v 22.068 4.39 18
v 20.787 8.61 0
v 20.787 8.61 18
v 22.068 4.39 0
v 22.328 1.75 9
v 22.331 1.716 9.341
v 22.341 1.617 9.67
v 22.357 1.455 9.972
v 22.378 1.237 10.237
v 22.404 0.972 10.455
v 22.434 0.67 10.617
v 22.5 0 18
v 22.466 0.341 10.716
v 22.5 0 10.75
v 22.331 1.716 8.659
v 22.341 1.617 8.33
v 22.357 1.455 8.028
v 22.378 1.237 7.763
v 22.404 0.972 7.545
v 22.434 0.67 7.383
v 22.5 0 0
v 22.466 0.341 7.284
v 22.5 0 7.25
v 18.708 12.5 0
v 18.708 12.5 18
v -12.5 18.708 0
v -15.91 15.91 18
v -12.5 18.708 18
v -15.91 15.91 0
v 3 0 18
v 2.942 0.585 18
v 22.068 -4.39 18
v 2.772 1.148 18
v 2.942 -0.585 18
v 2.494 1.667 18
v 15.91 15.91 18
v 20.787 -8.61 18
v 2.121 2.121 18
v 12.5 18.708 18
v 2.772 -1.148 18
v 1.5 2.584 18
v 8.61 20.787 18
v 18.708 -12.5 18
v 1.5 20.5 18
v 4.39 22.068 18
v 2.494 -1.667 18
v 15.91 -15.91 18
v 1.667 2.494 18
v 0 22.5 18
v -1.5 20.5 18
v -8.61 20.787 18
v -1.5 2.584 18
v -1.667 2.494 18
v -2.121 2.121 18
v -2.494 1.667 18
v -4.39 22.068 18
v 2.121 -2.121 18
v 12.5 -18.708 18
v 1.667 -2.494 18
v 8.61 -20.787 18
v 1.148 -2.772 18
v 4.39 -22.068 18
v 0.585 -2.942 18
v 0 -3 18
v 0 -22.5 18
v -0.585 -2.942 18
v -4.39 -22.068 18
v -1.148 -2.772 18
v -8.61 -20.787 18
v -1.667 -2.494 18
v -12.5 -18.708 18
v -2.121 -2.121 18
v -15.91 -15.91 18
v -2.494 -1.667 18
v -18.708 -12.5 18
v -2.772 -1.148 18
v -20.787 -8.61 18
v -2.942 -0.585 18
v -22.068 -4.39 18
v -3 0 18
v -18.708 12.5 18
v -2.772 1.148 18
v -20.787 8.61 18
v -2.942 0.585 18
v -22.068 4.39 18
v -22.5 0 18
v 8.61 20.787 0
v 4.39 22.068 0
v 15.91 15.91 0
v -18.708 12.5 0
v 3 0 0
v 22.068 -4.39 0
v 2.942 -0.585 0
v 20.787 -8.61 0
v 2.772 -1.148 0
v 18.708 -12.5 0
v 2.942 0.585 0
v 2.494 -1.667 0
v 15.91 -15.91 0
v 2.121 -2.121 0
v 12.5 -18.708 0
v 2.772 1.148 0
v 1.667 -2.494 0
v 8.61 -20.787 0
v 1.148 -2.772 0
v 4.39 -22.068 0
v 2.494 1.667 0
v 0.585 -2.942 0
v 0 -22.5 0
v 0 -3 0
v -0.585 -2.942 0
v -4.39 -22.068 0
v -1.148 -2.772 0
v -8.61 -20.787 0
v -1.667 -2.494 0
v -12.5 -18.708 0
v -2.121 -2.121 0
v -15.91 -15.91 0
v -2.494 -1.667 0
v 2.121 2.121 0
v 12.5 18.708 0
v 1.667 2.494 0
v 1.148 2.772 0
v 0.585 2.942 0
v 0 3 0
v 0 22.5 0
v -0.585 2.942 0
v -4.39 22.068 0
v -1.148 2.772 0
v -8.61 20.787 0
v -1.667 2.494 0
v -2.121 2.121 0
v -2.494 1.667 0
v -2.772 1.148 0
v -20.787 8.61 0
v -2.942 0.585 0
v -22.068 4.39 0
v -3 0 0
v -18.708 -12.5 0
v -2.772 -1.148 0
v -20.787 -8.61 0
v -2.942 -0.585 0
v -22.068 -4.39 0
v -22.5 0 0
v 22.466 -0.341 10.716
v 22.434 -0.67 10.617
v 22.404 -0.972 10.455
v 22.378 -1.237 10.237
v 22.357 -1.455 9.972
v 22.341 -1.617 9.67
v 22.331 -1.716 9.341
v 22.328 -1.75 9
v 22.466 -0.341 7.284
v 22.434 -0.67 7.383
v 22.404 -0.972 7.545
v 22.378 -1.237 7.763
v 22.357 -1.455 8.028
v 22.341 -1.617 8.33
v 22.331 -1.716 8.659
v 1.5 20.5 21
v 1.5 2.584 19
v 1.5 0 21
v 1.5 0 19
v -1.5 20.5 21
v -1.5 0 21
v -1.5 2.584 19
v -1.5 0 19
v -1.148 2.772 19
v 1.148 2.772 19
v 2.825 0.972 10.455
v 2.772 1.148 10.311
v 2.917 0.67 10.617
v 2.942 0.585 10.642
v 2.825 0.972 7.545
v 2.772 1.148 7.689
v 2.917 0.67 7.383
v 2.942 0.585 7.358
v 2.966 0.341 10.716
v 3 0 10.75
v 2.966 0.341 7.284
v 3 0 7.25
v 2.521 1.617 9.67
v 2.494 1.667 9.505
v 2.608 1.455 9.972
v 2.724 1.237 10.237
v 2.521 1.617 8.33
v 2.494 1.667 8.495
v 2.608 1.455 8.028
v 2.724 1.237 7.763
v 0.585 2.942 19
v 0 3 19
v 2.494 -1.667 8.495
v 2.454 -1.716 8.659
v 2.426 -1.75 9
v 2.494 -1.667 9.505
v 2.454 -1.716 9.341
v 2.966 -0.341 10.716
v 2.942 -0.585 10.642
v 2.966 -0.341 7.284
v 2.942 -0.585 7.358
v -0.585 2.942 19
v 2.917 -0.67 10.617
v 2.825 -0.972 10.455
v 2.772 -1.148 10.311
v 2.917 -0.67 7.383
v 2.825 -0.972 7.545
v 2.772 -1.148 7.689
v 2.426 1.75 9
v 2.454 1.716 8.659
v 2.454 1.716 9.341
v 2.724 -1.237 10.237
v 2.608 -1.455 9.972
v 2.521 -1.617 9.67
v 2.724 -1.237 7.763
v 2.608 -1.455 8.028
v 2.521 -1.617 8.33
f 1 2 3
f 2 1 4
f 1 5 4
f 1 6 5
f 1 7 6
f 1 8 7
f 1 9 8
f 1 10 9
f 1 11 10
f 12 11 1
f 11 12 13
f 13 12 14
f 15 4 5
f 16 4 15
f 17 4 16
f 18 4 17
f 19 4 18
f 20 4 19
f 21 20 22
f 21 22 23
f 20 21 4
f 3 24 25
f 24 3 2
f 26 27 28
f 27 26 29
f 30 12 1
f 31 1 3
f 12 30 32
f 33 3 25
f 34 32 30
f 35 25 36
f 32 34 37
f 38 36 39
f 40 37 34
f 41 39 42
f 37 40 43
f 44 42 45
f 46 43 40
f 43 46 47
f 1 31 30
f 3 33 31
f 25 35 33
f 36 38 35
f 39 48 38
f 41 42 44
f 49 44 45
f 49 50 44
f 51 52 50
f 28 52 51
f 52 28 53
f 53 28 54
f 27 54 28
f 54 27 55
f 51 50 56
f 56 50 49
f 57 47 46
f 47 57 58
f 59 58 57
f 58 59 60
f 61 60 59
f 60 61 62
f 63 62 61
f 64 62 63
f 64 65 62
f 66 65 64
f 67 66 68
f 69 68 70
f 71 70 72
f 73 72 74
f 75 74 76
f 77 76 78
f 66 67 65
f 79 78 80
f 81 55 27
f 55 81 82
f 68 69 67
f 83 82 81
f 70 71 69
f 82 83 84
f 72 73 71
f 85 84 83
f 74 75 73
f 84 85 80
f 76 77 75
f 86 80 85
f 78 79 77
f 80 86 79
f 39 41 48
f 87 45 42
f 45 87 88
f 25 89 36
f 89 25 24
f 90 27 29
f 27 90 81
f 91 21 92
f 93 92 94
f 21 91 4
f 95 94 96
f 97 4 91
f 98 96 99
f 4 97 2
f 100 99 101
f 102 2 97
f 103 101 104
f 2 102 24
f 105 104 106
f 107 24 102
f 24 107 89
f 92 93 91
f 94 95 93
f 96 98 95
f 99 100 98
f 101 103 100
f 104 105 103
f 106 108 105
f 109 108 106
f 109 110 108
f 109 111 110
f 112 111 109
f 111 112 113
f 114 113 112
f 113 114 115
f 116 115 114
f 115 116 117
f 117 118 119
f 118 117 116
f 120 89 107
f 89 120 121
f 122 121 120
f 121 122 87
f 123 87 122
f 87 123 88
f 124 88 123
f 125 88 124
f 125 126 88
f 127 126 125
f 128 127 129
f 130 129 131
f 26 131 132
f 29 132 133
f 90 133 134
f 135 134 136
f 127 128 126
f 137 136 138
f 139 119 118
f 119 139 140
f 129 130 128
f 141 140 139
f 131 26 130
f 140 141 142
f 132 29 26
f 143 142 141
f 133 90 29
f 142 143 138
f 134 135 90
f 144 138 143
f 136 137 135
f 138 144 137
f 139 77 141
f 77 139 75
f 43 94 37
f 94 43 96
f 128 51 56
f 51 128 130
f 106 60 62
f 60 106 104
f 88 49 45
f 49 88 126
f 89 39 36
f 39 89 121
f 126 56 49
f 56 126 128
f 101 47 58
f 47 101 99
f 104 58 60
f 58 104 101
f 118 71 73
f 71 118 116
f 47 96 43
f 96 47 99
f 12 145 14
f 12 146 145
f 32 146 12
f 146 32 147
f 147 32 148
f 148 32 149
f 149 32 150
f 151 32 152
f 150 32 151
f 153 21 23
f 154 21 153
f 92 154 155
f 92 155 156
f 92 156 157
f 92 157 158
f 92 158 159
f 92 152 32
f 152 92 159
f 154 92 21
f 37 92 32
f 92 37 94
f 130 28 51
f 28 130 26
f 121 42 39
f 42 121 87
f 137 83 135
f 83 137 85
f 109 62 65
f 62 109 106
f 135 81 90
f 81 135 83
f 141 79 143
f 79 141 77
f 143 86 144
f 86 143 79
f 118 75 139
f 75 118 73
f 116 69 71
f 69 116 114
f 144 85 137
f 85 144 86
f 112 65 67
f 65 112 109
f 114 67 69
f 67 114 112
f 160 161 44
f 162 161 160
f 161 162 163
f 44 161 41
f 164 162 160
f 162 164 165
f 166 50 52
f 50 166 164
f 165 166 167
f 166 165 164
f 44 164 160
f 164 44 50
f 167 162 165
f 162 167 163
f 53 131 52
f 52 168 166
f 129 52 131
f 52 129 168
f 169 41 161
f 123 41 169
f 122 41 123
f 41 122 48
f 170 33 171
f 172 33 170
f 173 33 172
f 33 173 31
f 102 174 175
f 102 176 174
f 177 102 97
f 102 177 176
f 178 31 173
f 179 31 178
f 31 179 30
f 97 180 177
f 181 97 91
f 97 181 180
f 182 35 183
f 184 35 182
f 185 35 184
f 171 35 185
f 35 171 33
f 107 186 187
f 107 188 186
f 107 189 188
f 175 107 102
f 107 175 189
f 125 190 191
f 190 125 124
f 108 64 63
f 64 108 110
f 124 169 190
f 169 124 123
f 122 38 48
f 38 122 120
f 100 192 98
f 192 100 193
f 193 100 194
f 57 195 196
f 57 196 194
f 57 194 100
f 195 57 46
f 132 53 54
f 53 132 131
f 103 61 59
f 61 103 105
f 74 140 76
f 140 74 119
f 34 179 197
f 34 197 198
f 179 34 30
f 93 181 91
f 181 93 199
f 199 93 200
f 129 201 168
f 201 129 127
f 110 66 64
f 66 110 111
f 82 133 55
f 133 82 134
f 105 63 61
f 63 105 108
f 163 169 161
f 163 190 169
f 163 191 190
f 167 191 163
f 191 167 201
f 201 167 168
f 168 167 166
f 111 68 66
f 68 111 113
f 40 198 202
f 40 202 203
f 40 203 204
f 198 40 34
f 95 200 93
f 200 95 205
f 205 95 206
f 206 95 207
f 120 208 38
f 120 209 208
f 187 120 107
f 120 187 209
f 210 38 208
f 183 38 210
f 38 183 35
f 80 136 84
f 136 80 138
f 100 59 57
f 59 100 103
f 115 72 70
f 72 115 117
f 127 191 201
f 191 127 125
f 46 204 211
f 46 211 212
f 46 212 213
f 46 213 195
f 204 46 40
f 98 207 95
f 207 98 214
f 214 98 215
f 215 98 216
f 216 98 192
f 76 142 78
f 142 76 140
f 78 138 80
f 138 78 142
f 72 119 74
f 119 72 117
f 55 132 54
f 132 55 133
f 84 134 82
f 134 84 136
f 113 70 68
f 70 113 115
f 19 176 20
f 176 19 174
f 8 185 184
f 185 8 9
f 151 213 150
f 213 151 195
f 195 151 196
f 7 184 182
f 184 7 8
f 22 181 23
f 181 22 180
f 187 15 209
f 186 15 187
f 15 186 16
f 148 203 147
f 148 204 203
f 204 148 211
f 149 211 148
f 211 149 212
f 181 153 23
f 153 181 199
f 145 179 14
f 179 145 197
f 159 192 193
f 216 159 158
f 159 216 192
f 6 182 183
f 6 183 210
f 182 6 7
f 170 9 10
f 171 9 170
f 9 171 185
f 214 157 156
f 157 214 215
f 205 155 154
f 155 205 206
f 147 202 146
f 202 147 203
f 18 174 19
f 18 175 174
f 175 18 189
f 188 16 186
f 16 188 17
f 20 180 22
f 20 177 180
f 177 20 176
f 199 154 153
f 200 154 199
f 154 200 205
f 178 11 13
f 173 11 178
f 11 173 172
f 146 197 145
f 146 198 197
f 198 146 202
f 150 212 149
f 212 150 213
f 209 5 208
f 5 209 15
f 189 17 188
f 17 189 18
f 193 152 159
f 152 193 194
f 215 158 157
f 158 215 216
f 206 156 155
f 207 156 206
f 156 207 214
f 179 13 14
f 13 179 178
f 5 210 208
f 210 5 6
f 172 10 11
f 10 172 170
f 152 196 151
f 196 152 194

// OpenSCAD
$fn = 32;

// ----------------------------------------------------------------------
// Control knob: pointer knob
// ----------------------------------------------------------------------

// --- parameters (mm) ---
rib_w = 3;                // pointer rib width
rib_h = 4;                // pointer rib height
knob_d = 45;              // knob body diameter
knob_h = 18;              // knob body height
bore_d = 6;               // shaft bore diameter
set_d = 3.5;              // set screw bore diameter

rib_poke = rib_h - 1;  // rib height above the top
total_h = knob_h + rib_h - 1;  // overall height

difference() {
  union() {
    cylinder(h = knob_h, d = knob_d);
    translate([-rib_w / 2, 0, knob_h - 1])
      cube([rib_w, knob_d / 2 - 2, rib_h]);
  }
  translate([0, 0, -1]) cylinder(h = knob_h + 2, d = bore_d);
  translate([-1, 0, knob_h / 2]) rotate([0, 90, 0])
    cylinder(h = knob_d / 2 + bore_d / 2 + 2, d = set_d);}
